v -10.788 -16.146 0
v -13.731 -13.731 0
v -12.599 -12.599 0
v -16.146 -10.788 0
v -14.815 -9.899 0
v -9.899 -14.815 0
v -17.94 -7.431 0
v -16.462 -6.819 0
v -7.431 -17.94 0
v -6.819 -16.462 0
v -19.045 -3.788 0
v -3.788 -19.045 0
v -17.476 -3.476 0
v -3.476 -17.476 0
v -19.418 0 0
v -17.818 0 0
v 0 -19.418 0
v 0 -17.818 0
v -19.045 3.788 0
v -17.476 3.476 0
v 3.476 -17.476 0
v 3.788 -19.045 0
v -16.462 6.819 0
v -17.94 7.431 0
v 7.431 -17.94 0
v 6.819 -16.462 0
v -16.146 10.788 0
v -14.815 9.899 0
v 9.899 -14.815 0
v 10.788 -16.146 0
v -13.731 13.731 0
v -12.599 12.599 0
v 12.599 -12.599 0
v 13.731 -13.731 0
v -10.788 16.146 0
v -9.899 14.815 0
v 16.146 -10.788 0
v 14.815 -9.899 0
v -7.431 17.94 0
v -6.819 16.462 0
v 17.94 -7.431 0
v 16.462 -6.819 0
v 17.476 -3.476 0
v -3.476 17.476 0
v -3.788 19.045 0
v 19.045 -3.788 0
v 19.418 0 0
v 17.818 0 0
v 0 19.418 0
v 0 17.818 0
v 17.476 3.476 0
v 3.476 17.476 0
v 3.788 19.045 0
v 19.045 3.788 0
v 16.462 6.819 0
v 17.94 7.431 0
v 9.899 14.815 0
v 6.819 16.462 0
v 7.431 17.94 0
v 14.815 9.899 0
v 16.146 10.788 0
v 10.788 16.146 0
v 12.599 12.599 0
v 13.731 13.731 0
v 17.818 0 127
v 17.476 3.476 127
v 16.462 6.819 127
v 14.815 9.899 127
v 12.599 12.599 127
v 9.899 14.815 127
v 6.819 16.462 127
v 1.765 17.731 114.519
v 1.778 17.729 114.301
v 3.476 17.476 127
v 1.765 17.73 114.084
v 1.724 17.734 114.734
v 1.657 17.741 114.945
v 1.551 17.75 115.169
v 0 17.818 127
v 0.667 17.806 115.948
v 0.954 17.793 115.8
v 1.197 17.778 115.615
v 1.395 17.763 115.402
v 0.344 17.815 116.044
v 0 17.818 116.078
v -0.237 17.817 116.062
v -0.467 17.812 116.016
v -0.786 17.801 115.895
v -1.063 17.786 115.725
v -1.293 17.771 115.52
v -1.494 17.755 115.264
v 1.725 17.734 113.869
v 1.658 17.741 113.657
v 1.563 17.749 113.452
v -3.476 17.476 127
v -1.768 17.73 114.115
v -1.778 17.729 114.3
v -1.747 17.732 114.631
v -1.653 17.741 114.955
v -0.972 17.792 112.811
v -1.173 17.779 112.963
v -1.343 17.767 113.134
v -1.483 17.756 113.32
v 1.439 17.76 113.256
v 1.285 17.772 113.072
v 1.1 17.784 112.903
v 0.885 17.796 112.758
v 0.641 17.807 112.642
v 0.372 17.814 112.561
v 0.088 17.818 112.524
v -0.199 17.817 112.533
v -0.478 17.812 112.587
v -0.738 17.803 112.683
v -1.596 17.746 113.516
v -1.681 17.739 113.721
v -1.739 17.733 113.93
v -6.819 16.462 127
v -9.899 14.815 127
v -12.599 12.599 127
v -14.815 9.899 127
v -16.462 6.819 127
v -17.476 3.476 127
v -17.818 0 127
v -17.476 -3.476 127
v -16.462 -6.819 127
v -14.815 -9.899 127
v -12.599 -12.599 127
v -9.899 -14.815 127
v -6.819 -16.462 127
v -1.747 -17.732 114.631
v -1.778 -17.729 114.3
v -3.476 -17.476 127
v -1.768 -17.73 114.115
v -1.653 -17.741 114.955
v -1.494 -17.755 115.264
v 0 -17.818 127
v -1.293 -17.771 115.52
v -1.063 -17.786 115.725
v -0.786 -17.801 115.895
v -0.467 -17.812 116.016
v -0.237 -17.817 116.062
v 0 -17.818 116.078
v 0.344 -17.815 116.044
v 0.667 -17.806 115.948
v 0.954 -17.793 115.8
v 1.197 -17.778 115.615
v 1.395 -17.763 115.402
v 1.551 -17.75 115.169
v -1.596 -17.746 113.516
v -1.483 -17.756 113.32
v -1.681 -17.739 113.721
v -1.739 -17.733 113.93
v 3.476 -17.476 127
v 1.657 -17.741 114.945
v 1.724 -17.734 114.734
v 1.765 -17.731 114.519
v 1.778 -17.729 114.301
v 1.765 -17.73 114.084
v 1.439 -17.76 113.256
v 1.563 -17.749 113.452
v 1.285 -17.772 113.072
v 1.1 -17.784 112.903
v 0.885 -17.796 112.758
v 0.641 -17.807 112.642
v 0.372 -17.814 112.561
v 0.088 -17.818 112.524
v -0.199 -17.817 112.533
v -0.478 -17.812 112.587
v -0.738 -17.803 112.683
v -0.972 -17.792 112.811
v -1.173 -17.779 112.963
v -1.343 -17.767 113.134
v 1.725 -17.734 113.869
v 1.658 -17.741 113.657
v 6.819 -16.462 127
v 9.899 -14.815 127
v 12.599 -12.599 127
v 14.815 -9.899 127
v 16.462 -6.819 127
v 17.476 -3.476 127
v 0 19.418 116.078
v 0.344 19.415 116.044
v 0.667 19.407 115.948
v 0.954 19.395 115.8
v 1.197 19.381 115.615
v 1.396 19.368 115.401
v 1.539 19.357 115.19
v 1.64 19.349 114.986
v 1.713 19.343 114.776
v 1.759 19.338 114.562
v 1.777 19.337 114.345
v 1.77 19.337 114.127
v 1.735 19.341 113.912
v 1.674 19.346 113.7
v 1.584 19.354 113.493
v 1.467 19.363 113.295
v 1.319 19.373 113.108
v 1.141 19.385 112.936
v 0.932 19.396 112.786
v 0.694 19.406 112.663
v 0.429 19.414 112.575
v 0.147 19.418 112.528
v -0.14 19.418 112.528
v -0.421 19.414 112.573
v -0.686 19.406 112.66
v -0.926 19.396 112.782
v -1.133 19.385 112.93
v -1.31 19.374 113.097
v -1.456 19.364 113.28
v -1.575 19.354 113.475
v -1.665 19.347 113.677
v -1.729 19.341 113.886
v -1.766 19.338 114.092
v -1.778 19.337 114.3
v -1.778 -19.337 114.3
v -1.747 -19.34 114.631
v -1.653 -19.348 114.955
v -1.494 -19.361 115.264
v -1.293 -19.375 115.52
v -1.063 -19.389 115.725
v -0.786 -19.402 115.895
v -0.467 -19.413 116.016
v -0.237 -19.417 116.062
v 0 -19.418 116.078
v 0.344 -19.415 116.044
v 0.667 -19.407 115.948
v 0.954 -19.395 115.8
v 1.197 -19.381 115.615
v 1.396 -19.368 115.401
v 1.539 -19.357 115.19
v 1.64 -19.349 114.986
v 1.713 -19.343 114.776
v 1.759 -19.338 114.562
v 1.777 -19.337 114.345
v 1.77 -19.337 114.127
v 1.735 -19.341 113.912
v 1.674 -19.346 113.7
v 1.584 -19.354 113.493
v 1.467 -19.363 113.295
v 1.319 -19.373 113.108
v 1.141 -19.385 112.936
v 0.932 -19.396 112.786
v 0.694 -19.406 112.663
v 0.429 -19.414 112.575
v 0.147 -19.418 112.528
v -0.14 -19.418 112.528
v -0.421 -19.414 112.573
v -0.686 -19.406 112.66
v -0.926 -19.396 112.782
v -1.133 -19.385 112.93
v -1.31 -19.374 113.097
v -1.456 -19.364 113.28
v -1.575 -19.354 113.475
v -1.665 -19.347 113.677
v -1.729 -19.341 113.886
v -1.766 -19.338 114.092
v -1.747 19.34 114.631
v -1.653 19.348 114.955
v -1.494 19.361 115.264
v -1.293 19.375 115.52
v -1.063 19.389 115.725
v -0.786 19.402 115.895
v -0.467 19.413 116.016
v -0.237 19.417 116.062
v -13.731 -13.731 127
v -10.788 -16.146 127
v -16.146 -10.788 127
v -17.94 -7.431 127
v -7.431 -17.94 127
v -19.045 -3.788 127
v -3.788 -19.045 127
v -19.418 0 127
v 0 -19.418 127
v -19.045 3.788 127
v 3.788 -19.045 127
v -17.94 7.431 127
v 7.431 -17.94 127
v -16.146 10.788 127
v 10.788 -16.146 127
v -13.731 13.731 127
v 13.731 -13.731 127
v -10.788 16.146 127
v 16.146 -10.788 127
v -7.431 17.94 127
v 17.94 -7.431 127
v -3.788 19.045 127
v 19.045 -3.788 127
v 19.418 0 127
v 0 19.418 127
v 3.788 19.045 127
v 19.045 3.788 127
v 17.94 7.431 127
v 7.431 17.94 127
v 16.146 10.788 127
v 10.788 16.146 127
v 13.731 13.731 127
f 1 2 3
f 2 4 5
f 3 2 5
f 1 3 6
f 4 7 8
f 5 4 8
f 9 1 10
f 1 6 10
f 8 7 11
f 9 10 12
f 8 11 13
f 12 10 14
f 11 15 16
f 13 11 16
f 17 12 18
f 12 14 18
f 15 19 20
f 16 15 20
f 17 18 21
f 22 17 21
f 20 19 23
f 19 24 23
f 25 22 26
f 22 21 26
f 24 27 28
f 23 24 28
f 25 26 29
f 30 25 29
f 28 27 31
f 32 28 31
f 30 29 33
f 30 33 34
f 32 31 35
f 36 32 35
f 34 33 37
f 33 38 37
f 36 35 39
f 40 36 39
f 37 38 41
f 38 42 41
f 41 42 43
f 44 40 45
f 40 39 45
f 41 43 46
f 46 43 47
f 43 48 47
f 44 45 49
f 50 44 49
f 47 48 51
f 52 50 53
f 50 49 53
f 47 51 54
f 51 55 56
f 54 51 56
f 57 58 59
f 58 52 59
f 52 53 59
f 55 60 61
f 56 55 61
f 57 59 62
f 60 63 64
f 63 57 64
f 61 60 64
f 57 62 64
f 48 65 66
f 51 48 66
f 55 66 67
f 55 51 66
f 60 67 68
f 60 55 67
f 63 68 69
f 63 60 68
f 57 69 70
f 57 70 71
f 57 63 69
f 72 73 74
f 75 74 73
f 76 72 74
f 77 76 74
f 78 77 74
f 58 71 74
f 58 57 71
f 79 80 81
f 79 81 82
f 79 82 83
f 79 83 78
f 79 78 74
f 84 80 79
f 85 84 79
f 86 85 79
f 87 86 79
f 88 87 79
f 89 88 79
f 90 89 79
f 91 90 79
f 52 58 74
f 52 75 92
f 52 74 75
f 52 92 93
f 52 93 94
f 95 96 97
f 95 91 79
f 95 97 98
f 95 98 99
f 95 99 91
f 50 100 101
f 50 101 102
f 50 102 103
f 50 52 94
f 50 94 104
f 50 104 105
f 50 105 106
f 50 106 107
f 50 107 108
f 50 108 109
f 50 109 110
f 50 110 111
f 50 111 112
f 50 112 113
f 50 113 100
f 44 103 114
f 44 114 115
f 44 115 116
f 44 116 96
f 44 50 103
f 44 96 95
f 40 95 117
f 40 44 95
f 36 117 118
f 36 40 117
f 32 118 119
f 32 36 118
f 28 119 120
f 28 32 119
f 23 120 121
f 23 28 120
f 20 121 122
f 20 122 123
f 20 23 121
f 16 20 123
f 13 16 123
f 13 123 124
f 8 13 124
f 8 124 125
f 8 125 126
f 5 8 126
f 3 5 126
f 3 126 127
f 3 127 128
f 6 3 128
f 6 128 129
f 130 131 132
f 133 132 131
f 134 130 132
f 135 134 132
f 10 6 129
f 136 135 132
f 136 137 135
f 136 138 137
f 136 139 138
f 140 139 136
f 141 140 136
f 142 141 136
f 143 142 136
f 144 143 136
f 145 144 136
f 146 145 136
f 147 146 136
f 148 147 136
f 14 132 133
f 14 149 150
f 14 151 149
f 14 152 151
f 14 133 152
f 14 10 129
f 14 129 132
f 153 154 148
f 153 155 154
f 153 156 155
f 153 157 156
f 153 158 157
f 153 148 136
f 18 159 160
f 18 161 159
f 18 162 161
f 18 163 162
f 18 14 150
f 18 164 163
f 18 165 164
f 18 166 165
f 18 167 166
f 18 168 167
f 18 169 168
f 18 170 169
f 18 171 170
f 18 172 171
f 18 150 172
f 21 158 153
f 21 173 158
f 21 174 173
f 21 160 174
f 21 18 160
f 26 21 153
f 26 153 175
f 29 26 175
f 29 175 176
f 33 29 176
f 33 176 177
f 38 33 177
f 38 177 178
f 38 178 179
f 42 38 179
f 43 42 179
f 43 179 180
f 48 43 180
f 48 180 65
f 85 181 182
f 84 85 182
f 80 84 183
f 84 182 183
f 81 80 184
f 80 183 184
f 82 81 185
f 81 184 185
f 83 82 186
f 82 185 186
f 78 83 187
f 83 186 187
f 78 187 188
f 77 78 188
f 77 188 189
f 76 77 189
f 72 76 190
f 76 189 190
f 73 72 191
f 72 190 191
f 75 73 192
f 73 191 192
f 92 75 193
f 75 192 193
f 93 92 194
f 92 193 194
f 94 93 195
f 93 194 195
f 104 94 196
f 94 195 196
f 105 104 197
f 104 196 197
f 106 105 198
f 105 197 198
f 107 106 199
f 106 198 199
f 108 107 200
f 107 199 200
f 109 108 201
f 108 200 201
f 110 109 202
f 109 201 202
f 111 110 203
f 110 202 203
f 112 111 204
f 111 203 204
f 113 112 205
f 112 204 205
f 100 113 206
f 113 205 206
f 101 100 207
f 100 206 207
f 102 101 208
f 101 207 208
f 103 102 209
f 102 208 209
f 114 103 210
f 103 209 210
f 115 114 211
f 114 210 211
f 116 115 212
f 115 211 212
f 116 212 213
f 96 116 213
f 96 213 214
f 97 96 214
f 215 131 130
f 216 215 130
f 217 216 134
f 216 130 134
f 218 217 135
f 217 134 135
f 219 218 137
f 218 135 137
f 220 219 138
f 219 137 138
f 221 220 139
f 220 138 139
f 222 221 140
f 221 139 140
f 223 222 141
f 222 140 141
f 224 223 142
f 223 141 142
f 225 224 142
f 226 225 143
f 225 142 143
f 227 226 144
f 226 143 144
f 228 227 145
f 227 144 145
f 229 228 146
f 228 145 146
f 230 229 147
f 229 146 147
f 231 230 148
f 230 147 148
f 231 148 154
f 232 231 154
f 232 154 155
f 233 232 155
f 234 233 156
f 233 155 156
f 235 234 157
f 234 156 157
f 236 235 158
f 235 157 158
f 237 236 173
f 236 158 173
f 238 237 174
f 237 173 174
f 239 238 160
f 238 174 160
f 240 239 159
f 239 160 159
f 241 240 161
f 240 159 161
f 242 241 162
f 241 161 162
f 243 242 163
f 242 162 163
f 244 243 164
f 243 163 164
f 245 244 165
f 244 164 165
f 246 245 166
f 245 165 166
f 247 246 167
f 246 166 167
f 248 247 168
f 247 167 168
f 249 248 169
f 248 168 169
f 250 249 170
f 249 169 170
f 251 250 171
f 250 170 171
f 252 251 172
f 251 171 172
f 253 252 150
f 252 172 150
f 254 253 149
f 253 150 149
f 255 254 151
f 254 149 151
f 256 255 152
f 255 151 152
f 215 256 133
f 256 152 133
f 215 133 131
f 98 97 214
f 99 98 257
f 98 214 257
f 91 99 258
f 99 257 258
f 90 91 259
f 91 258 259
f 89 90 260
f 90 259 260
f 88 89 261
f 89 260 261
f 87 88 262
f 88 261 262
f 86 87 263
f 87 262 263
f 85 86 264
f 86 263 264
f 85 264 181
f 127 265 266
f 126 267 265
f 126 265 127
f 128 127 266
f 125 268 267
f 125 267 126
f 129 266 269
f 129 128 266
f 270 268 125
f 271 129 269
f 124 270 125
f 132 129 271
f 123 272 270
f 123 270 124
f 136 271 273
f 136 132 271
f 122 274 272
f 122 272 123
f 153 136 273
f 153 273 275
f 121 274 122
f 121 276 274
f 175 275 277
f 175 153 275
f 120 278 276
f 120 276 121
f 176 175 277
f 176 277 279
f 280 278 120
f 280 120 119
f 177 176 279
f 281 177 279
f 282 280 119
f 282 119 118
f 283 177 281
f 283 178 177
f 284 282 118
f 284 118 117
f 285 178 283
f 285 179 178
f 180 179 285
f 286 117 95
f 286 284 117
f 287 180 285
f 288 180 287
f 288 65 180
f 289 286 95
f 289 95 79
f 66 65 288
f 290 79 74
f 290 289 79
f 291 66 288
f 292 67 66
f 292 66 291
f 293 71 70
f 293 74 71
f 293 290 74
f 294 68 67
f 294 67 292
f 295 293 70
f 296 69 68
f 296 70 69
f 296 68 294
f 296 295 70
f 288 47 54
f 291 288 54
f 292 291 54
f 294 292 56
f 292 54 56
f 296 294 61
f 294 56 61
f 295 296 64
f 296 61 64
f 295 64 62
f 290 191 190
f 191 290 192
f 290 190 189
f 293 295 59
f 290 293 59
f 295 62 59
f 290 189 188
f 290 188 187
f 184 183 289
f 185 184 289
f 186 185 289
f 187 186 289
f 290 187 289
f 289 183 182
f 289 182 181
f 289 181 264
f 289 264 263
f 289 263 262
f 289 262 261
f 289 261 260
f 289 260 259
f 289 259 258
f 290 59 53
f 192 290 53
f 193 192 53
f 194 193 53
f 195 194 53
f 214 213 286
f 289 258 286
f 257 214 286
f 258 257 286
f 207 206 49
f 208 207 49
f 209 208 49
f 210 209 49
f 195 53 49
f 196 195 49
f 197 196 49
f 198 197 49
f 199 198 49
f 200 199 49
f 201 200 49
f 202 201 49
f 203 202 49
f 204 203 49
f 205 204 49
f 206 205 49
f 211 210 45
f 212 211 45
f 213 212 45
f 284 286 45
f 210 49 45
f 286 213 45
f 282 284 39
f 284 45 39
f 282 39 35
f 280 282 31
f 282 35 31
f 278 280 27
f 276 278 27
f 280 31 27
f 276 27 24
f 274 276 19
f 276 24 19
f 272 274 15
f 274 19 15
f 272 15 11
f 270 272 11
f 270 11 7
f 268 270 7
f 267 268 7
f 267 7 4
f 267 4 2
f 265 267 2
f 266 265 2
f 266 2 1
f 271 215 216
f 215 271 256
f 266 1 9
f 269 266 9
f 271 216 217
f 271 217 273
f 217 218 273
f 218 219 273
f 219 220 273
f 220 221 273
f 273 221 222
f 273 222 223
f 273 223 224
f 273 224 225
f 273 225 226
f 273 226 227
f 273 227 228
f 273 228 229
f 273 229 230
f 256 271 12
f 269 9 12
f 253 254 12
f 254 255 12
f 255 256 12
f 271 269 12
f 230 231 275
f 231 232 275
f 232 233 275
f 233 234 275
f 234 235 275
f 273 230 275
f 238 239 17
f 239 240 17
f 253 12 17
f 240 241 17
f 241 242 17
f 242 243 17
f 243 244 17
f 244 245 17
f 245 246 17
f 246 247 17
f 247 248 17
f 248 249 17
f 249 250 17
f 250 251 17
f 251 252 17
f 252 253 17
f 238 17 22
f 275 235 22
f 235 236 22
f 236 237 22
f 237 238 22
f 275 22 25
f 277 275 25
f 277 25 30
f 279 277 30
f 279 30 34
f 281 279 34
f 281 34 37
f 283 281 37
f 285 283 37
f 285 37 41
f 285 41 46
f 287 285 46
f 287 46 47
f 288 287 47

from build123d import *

# Parameters (mm, degrees)
F0_R     = 19.4183
F0_R_2   = 17.8181
F1_DEPTH = 127
F5_DEPTH = 50.8


with BuildPart() as f1:
    # F0 (on Top) → F1 (new body)
    with BuildSketch(Plane.XY):
        Circle(F0_R)
        Circle(F0_R_2, mode=Mode.SUBTRACT)
    extrude(amount=F1_DEPTH)

    # F4 (on face) → F5 (cut, symmetric)
    with BuildSketch(Plane(origin=(0, 19.4183, 0), x_dir=(-1, 0, 0), z_dir=(0, 1, 0))):
        with BuildLine():
            ThreePointArc((0, 116.078), (-1.257236, 113.042764), (1.778, 114.3))
            ThreePointArc((1.778, 114.3), (1.257236, 115.557236), (0, 116.078))
        make_face()
    extrude(amount=F5_DEPTH, both=True, mode=Mode.SUBTRACT)


solid = f1.part
